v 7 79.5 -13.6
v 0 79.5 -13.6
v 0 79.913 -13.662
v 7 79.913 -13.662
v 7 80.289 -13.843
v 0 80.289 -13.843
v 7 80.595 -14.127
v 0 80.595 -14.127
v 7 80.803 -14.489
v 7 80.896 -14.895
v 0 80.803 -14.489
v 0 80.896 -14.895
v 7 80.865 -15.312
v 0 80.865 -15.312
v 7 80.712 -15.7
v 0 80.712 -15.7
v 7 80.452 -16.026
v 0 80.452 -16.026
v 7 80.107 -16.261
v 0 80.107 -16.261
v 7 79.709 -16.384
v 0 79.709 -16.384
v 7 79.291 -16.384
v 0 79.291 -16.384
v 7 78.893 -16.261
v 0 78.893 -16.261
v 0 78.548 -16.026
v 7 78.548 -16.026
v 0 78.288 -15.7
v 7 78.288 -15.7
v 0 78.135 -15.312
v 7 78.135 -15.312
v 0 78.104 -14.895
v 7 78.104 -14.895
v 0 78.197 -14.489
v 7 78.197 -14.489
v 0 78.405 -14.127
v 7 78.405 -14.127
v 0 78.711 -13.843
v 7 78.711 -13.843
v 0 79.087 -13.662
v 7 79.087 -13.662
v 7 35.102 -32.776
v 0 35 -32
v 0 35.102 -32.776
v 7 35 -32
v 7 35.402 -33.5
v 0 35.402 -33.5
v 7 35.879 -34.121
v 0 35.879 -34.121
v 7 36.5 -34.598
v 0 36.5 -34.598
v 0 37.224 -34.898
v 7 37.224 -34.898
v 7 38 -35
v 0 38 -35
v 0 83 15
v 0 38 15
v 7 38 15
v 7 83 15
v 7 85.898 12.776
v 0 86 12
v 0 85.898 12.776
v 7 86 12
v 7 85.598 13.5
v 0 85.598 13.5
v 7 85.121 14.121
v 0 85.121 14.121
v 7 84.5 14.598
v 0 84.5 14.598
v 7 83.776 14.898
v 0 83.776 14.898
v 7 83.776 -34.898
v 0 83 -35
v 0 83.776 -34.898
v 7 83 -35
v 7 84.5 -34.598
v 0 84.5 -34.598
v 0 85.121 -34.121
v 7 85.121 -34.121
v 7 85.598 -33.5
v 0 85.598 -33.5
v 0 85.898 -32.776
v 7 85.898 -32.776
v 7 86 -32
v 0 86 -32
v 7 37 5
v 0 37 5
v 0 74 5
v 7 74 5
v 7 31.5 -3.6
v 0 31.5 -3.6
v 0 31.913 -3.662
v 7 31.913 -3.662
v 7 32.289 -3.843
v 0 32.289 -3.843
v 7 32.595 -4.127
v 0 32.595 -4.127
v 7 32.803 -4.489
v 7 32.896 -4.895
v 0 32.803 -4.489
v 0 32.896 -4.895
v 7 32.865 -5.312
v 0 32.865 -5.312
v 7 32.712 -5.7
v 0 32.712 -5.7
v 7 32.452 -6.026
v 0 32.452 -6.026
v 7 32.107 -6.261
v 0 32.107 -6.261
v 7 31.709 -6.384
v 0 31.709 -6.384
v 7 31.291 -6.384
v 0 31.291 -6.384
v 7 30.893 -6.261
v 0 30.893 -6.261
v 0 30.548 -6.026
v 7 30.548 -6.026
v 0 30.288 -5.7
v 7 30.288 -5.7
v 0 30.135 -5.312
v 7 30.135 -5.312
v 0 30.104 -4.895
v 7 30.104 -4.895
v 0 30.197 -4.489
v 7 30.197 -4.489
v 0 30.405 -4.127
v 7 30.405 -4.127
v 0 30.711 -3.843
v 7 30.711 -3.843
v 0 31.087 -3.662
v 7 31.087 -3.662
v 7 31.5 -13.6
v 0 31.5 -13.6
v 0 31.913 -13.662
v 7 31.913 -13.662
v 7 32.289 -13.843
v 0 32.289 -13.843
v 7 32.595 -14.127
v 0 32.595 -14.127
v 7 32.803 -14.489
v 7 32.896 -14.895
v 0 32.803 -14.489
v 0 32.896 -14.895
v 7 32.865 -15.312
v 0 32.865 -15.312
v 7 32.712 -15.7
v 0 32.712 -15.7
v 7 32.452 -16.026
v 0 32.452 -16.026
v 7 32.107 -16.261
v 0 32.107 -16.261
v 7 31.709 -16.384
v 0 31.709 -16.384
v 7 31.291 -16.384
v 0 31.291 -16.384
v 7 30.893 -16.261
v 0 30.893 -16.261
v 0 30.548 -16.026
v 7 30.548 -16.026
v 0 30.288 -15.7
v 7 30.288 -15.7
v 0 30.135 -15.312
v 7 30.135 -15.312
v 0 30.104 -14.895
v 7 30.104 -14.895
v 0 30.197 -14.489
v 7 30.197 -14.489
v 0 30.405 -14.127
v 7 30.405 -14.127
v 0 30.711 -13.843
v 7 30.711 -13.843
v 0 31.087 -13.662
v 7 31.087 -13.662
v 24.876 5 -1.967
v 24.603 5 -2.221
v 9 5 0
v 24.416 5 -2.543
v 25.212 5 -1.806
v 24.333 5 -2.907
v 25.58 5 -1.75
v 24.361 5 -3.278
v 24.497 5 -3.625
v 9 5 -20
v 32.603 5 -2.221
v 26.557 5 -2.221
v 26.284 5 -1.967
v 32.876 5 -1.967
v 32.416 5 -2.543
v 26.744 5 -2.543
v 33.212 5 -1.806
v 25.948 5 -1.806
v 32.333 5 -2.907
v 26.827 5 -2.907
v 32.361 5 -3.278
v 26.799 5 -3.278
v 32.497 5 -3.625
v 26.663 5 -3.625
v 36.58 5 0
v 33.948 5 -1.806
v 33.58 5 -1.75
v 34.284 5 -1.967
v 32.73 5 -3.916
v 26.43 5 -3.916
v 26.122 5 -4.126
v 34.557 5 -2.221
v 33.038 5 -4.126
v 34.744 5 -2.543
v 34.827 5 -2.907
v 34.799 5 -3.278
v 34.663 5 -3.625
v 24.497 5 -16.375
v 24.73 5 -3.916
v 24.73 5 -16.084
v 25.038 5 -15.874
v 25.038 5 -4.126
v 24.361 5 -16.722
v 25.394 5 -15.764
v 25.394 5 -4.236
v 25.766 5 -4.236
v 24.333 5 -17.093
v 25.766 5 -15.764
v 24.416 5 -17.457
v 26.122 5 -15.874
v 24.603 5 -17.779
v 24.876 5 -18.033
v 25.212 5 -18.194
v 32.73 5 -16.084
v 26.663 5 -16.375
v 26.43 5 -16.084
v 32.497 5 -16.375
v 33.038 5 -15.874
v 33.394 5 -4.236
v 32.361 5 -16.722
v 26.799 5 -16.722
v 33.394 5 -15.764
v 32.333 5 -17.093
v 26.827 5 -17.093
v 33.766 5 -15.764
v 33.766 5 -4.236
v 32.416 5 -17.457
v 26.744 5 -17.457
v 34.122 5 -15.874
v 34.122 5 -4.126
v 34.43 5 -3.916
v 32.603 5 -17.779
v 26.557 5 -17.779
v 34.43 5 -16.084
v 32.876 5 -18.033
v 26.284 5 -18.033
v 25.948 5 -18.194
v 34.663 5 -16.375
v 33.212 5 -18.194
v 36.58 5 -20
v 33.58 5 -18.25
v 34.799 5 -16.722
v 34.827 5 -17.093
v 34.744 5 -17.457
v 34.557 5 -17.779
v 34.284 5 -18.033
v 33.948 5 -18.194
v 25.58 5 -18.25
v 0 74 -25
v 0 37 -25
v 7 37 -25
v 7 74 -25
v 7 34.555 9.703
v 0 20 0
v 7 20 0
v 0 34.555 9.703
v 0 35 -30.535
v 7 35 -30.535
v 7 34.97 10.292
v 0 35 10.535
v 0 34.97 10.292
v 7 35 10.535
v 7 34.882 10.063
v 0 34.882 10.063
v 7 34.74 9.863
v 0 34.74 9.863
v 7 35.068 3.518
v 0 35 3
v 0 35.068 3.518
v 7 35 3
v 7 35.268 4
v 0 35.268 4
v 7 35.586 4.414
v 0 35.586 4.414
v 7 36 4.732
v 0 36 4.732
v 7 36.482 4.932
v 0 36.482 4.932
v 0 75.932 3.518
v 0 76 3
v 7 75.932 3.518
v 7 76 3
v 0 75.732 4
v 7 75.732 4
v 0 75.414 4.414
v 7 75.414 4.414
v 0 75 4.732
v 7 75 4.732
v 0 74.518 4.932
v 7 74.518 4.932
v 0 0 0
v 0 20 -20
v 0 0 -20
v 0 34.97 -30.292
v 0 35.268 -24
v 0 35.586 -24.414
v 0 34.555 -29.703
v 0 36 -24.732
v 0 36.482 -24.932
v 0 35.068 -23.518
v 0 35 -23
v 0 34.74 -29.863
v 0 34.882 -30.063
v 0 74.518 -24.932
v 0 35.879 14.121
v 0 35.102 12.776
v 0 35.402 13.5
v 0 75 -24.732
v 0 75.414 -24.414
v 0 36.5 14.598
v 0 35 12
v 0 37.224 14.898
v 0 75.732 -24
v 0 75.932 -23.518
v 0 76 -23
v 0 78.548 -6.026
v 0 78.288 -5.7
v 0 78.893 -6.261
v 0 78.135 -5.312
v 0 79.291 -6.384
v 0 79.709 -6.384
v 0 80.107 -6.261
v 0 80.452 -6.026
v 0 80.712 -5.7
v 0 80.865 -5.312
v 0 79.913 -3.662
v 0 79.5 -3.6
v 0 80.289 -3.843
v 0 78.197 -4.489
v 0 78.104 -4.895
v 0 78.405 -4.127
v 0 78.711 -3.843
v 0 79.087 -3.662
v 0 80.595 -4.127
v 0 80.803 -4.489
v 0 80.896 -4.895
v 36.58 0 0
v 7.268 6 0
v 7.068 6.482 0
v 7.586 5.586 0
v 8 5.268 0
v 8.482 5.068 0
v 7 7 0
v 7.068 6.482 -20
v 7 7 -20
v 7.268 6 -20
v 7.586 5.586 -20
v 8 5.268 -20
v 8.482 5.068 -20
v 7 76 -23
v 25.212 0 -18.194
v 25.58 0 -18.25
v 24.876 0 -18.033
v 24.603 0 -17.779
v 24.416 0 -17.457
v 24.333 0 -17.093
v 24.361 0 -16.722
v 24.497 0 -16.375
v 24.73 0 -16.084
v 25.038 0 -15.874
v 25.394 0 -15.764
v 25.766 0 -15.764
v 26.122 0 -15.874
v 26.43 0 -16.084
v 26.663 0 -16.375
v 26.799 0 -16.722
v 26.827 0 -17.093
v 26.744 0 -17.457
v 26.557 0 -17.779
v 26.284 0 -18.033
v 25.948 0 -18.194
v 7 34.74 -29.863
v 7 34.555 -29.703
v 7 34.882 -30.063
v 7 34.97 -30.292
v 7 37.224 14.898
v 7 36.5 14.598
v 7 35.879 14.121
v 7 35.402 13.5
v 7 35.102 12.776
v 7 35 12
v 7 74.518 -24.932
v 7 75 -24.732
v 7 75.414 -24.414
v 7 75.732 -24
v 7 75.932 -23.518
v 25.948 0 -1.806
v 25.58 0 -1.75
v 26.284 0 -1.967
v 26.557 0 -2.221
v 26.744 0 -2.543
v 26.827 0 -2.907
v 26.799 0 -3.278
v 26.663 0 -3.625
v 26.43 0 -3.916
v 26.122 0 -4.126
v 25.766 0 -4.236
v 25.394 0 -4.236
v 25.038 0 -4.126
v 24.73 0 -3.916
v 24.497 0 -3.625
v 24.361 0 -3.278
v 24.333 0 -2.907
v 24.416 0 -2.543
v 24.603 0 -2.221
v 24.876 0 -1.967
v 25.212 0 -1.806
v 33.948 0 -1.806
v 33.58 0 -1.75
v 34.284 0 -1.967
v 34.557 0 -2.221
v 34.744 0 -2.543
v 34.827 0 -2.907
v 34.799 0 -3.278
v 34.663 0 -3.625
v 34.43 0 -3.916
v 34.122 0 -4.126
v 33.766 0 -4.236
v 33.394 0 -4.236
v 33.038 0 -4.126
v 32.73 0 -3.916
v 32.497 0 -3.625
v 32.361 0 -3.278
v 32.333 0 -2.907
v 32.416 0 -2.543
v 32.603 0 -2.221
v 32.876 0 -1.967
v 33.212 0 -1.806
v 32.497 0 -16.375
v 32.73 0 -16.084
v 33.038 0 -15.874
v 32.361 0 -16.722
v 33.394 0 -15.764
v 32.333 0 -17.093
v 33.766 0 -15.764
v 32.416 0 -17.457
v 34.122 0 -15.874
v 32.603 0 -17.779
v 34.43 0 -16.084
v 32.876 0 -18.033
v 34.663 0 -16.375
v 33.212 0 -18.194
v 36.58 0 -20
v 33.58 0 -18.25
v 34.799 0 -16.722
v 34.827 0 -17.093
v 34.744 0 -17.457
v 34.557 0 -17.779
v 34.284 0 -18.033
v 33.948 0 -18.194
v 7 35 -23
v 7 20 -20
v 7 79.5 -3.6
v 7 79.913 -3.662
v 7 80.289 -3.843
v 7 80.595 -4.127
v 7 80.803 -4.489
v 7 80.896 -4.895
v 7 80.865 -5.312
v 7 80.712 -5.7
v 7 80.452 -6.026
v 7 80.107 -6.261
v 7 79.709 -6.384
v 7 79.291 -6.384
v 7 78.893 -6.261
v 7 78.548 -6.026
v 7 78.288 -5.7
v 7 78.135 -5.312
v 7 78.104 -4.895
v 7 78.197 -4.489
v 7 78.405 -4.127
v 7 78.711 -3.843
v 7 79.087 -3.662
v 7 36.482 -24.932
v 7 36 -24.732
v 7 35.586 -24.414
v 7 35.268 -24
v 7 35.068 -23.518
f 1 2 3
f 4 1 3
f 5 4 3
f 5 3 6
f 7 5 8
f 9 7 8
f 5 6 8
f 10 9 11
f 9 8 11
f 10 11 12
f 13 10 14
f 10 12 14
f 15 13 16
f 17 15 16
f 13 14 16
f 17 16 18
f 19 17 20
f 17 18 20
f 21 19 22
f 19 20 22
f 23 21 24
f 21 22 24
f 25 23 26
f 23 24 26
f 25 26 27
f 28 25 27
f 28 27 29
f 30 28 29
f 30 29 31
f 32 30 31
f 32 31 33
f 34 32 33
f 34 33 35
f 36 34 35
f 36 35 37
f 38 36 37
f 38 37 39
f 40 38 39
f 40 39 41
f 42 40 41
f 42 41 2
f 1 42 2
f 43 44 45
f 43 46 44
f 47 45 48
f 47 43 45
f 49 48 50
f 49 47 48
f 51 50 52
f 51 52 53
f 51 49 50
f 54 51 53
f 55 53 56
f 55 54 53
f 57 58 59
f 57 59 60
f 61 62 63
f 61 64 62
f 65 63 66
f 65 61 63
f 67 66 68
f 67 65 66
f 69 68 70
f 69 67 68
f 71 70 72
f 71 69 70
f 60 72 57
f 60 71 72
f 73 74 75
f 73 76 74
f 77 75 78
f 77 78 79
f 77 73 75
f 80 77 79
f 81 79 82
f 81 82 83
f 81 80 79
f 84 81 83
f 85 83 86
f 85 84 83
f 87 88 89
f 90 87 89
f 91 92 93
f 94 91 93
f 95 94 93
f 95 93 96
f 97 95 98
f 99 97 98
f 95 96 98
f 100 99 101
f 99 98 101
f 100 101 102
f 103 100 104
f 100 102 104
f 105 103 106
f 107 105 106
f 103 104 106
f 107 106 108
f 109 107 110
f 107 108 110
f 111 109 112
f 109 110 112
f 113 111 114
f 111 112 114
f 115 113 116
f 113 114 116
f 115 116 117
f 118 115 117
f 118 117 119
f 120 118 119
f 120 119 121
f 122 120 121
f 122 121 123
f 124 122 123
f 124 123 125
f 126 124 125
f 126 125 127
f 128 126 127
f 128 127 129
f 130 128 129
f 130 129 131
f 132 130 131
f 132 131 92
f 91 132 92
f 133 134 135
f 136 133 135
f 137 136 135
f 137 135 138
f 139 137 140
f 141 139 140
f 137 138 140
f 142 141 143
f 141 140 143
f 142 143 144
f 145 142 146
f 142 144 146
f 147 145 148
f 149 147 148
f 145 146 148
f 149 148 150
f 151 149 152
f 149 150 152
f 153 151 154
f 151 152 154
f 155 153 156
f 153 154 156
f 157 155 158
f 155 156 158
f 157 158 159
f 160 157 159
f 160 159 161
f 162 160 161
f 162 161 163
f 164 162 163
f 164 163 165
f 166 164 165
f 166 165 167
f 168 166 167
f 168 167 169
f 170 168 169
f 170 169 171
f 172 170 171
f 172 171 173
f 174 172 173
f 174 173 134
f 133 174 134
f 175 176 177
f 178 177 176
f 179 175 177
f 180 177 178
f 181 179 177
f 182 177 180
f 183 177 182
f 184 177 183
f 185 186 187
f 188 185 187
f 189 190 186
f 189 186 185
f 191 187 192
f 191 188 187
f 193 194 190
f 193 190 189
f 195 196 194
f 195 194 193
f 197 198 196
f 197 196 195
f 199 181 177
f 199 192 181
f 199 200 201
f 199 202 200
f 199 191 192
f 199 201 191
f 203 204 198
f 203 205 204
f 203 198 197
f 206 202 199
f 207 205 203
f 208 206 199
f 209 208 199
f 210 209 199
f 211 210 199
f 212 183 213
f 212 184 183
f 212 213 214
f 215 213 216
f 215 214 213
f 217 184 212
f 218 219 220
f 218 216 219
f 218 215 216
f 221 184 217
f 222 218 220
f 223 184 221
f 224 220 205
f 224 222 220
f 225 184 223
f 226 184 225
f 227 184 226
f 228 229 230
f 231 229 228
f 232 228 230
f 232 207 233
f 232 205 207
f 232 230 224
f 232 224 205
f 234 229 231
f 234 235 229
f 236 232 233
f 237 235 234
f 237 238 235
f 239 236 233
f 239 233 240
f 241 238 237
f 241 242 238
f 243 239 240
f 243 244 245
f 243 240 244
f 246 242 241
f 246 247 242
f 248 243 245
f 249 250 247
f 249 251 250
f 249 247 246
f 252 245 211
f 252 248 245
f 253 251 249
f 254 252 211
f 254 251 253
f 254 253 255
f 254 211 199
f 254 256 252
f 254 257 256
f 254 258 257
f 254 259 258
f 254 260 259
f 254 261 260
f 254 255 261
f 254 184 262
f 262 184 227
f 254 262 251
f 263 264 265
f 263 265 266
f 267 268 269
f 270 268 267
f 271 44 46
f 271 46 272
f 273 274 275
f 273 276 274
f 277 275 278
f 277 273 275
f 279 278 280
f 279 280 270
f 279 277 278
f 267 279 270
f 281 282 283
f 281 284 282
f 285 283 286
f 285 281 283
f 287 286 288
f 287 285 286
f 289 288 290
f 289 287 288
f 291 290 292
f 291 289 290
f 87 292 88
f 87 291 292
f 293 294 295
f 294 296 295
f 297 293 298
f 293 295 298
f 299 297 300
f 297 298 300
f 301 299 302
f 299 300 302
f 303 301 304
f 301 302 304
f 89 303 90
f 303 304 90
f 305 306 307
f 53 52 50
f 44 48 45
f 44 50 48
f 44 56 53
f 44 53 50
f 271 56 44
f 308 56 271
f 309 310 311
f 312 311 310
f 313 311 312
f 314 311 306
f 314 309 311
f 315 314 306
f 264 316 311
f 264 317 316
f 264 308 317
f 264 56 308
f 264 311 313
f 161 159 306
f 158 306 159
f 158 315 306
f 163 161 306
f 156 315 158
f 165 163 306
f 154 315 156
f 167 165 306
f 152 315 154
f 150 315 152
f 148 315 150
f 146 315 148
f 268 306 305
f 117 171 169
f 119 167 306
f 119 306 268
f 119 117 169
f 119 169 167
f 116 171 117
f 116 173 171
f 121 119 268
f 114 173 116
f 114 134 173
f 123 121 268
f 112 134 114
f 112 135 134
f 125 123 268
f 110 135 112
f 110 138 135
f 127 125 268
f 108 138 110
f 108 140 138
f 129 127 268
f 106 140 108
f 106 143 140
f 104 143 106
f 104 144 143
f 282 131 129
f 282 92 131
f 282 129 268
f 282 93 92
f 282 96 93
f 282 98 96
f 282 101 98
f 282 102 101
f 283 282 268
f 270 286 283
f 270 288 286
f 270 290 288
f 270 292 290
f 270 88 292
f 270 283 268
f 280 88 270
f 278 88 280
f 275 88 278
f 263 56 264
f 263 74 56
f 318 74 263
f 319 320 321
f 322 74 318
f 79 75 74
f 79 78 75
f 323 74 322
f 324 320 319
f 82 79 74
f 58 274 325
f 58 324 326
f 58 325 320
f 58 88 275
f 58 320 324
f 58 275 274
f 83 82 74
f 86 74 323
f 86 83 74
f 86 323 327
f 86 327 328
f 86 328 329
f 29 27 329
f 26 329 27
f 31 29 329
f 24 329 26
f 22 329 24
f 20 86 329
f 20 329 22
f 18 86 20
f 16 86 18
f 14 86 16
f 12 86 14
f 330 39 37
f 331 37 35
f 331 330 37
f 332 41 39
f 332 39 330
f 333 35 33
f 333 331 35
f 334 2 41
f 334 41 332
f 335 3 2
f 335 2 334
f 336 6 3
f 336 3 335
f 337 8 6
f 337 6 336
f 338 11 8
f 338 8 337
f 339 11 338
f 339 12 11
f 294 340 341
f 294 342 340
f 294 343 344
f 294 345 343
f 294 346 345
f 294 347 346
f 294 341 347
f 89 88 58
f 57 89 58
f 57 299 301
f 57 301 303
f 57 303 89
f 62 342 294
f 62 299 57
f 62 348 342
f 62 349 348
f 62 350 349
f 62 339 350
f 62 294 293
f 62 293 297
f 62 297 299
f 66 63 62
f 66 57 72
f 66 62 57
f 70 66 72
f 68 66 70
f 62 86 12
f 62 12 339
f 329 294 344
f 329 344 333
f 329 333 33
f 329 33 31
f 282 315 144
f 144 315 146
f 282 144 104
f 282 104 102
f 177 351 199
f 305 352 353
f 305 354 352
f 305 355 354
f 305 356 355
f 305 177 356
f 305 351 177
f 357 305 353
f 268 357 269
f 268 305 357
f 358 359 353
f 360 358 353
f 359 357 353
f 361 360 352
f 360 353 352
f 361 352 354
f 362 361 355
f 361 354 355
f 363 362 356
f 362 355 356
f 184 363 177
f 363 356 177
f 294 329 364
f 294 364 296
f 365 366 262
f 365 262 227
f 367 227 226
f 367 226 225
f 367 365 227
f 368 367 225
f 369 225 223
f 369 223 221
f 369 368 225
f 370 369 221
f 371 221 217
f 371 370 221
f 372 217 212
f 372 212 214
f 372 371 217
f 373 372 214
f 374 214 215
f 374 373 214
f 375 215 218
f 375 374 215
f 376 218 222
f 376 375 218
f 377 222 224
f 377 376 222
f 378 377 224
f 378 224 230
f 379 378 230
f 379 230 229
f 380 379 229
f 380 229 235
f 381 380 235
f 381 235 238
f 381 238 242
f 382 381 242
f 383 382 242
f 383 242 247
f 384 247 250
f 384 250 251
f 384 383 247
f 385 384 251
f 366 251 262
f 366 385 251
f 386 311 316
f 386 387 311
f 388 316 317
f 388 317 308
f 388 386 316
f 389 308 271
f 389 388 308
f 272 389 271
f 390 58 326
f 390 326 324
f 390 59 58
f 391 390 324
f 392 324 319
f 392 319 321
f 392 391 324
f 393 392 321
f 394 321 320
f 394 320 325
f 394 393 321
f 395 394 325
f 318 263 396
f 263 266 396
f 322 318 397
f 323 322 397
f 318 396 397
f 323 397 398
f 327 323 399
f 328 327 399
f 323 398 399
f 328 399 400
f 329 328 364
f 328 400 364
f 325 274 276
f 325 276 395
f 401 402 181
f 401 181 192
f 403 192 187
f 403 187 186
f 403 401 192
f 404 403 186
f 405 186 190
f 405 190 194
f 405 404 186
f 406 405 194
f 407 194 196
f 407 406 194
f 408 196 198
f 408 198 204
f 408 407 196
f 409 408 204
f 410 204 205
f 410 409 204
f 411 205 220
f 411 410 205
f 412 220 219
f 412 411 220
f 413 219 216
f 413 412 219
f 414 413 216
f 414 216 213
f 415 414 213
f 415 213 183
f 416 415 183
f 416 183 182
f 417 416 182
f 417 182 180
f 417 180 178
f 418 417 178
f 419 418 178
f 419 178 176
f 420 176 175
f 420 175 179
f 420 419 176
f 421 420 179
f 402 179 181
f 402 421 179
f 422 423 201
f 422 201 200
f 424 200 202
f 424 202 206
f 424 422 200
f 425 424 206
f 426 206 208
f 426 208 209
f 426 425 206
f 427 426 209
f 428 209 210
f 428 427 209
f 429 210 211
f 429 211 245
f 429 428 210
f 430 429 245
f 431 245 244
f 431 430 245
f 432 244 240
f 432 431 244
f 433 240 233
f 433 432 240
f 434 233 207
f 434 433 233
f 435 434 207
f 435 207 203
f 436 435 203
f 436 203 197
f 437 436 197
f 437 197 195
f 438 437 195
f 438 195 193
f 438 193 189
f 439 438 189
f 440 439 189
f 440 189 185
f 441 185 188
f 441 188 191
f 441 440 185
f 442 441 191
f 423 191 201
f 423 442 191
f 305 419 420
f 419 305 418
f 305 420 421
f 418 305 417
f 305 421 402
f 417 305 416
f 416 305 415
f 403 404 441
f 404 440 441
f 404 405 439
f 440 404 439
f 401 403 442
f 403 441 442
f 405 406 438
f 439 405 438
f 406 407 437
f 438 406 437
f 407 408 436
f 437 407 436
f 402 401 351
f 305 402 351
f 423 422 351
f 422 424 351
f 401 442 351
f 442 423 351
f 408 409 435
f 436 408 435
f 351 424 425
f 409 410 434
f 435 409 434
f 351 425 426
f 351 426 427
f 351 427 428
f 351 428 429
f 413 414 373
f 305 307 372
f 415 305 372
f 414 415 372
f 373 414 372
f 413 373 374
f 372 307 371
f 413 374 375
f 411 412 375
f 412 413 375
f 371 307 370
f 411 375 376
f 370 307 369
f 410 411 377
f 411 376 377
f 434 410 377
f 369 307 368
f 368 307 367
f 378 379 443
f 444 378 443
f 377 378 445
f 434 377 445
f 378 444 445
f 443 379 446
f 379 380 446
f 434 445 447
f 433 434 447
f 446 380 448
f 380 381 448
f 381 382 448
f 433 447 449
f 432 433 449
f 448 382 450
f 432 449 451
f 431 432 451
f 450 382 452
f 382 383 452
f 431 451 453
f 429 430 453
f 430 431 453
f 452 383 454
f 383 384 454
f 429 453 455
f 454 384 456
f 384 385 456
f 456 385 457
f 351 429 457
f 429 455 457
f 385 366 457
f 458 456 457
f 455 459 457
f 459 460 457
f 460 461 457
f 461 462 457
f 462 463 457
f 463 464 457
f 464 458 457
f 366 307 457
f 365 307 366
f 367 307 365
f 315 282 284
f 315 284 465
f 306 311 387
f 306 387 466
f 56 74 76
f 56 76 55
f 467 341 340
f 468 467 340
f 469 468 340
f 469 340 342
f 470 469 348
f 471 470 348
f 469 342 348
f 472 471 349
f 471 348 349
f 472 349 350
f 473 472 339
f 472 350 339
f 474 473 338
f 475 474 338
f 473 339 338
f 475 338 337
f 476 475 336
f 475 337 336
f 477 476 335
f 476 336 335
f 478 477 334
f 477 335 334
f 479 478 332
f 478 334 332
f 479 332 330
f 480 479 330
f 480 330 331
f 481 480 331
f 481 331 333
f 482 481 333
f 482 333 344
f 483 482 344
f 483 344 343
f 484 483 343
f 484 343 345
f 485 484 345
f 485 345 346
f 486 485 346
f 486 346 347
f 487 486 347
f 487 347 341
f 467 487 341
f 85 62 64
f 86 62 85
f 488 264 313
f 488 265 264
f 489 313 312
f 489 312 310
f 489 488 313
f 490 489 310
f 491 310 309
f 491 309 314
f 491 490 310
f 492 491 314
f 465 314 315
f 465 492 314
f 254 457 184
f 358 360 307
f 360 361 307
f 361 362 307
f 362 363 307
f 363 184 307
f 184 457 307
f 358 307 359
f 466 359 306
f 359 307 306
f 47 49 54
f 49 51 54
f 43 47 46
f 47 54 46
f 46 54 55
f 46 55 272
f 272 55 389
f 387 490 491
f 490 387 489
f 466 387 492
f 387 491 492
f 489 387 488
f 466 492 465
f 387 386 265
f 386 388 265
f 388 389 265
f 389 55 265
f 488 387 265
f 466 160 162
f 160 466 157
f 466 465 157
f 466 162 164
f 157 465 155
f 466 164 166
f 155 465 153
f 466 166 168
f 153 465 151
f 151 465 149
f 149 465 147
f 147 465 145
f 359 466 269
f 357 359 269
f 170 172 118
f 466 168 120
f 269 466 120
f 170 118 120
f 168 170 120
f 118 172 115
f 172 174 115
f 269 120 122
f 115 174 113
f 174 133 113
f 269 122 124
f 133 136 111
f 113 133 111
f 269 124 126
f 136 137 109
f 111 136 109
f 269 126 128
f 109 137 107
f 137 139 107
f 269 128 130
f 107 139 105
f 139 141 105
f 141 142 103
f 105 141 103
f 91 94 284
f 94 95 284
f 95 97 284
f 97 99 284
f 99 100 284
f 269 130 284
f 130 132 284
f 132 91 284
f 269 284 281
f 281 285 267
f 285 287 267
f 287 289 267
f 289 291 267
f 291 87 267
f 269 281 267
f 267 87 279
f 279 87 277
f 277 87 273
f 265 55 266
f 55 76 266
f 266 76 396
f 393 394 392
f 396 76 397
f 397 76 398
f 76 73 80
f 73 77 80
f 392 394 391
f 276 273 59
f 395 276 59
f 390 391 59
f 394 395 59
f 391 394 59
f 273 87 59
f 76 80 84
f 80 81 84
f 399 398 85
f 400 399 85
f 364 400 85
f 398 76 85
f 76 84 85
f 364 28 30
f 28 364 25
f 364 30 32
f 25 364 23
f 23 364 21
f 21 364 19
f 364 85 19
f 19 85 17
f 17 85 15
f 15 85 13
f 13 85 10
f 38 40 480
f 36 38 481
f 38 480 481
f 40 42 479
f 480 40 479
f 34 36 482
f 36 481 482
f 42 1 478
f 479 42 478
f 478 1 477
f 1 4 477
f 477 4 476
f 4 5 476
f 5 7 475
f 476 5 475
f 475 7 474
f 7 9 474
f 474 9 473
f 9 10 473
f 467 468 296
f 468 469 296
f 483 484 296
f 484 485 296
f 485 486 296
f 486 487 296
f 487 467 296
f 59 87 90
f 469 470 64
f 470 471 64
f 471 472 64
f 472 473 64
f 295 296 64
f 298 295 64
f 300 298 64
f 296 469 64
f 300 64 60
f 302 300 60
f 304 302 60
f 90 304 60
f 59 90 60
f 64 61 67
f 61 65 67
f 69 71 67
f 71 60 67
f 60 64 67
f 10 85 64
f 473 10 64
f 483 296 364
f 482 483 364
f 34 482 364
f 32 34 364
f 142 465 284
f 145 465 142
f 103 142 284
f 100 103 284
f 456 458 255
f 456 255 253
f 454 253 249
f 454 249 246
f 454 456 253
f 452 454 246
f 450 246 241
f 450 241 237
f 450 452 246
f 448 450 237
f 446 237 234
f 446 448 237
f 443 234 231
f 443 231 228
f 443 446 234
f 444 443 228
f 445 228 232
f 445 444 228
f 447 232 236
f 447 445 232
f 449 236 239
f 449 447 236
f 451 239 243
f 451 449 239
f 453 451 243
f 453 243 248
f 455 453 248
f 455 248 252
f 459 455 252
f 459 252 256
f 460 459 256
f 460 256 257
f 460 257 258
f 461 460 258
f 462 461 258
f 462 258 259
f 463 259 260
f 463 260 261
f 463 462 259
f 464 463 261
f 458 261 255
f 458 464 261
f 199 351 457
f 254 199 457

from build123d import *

# Parameters (mm, degrees)
SKETCH1_W           = 36.58
SKETCH1_H           = 20
SKETCH1_R           = 1.25
BOSS_EXTRUDE1_DEPTH = 5
SKETCH3_W           = 20
SKETCH3_H           = 30
SKETCH3_W_2         = 10
SKETCH3_H_2         = 41
BOSS_EXTRUDE2_DEPTH = 7
FILLET1_R           = 3
FILLET2_R           = 1
CUT_EXTRUDE1_REACH  = 101.795
SKETCH6_R           = 1.4
FILLET3_R           = 2


with BuildPart() as part:
    # Sketch1 → Boss-Extrude1 (new body)
    with BuildSketch(Plane(origin=(0, 0, 0), x_dir=(1, 0, 0), z_dir=(0, 1, 0))):
        with Locations((18.29, 10)):
            Rectangle(SKETCH1_W, SKETCH1_H)
        with Locations(Location((25.58, 3, 0), (0, 0, 270))):
            Circle(SKETCH1_R, mode=Mode.SUBTRACT)
        with Locations(Location((33.58, 3, 0), (0, 0, 270))):
            Circle(SKETCH1_R, mode=Mode.SUBTRACT)
        with Locations(Location((33.58, 17, 0), (0, 0, 90))):
            Circle(SKETCH1_R, mode=Mode.SUBTRACT)
        with Locations(Location((25.58, 17, 0), (0, 0, 90))):
            Circle(SKETCH1_R, mode=Mode.SUBTRACT)
    extrude(amount=BOSS_EXTRUDE1_DEPTH)

    # Sketch3 → Boss-Extrude2 (add)
    with BuildSketch(Plane.ZY):
        with Locations((-10, 20)):
            Rectangle(SKETCH3_W, SKETCH3_H)
        Polygon((-20, 20), (-20, 35), (-25, 35), (-30, 35), align=None)
        with Locations((-30, 55.5)):
            Rectangle(SKETCH3_W_2, SKETCH3_H_2)
        Polygon((-25, 76), (5, 76), (15, 76), (15, 86), (-35, 86), (-35, 76), align=None)
        with Locations((10, 55.5)):
            Rectangle(SKETCH3_W_2, SKETCH3_H_2)
        Polygon((5, 35), (0, 35), (0, 20), (10, 35), align=None)
    extrude(amount=-BOSS_EXTRUDE2_DEPTH)

    # Fillet1
    fillet1_edges = [part.edges().sort_by_distance(p)[0] for p in [
        (3.5, 86, 15),
        (3.5, 35, 15),
        (3.5, 35, -35),
        (3.5, 86, -35),
    ]]
    fillet(fillet1_edges, radius=FILLET1_R)

    # Fillet2
    fillet2_edges = [part.edges().sort_by_distance(p)[0] for p in [
        (3.5, 35, 10),
        (3.5, 35, -30),
    ]]
    fillet(fillet2_edges, radius=FILLET2_R)

    # Sketch6 → Cut-Extrude1 (cut, up to next)
    with BuildSketch(Plane.ZY, mode=Mode.PRIVATE) as cut_extrude1_sk1:
        with Locations((-15, 31.5)):
            Circle(SKETCH6_R)
    cut_extrude1_tool1 = extrude(cut_extrude1_sk1.sketch, amount=-CUT_EXTRUDE1_REACH, mode=Mode.PRIVATE) & part.part
    # Sketch6 → Cut-Extrude1 (cut, up to next)
    with BuildSketch(Plane.ZY, mode=Mode.PRIVATE) as cut_extrude1_sk2:
        with Locations((-5, 31.5)):
            Circle(SKETCH6_R)
    cut_extrude1_tool2 = extrude(cut_extrude1_sk2.sketch, amount=-CUT_EXTRUDE1_REACH, mode=Mode.PRIVATE) & part.part
    # Sketch6 → Cut-Extrude1 (cut, up to next)
    with BuildSketch(Plane.ZY, mode=Mode.PRIVATE) as cut_extrude1_sk3:
        with Locations((-15, 79.5)):
            Circle(SKETCH6_R)
    cut_extrude1_tool3 = extrude(cut_extrude1_sk3.sketch, amount=-CUT_EXTRUDE1_REACH, mode=Mode.PRIVATE) & part.part
    # Sketch6 → Cut-Extrude1 (cut, up to next)
    with BuildSketch(Plane.ZY, mode=Mode.PRIVATE) as cut_extrude1_sk4:
        with Locations((-5, 79.5)):
            Circle(SKETCH6_R)
    cut_extrude1_tool4 = extrude(cut_extrude1_sk4.sketch, amount=-CUT_EXTRUDE1_REACH, mode=Mode.PRIVATE) & part.part
    add(cut_extrude1_tool1.solids().sort_by_distance((0, 31.5, -15))[0], mode=Mode.SUBTRACT)
    add(cut_extrude1_tool2.solids().sort_by_distance((0, 31.5, -5))[0], mode=Mode.SUBTRACT)
    add(cut_extrude1_tool3.solids().sort_by_distance((0, 79.5, -15))[0], mode=Mode.SUBTRACT)
    add(cut_extrude1_tool4.solids().sort_by_distance((0, 79.5, -5))[0], mode=Mode.SUBTRACT)

    # Fillet3
    fillet3_edges = [part.edges().sort_by_distance(p)[0] for p in [
        (3.5, 76, 5),
        (3.5, 76, -25),
        (3.5, 35, -25),
        (3.5, 35, 5),
        (7, 5, -10),
    ]]
    fillet(fillet3_edges, radius=FILLET3_R)


solid = part.part
